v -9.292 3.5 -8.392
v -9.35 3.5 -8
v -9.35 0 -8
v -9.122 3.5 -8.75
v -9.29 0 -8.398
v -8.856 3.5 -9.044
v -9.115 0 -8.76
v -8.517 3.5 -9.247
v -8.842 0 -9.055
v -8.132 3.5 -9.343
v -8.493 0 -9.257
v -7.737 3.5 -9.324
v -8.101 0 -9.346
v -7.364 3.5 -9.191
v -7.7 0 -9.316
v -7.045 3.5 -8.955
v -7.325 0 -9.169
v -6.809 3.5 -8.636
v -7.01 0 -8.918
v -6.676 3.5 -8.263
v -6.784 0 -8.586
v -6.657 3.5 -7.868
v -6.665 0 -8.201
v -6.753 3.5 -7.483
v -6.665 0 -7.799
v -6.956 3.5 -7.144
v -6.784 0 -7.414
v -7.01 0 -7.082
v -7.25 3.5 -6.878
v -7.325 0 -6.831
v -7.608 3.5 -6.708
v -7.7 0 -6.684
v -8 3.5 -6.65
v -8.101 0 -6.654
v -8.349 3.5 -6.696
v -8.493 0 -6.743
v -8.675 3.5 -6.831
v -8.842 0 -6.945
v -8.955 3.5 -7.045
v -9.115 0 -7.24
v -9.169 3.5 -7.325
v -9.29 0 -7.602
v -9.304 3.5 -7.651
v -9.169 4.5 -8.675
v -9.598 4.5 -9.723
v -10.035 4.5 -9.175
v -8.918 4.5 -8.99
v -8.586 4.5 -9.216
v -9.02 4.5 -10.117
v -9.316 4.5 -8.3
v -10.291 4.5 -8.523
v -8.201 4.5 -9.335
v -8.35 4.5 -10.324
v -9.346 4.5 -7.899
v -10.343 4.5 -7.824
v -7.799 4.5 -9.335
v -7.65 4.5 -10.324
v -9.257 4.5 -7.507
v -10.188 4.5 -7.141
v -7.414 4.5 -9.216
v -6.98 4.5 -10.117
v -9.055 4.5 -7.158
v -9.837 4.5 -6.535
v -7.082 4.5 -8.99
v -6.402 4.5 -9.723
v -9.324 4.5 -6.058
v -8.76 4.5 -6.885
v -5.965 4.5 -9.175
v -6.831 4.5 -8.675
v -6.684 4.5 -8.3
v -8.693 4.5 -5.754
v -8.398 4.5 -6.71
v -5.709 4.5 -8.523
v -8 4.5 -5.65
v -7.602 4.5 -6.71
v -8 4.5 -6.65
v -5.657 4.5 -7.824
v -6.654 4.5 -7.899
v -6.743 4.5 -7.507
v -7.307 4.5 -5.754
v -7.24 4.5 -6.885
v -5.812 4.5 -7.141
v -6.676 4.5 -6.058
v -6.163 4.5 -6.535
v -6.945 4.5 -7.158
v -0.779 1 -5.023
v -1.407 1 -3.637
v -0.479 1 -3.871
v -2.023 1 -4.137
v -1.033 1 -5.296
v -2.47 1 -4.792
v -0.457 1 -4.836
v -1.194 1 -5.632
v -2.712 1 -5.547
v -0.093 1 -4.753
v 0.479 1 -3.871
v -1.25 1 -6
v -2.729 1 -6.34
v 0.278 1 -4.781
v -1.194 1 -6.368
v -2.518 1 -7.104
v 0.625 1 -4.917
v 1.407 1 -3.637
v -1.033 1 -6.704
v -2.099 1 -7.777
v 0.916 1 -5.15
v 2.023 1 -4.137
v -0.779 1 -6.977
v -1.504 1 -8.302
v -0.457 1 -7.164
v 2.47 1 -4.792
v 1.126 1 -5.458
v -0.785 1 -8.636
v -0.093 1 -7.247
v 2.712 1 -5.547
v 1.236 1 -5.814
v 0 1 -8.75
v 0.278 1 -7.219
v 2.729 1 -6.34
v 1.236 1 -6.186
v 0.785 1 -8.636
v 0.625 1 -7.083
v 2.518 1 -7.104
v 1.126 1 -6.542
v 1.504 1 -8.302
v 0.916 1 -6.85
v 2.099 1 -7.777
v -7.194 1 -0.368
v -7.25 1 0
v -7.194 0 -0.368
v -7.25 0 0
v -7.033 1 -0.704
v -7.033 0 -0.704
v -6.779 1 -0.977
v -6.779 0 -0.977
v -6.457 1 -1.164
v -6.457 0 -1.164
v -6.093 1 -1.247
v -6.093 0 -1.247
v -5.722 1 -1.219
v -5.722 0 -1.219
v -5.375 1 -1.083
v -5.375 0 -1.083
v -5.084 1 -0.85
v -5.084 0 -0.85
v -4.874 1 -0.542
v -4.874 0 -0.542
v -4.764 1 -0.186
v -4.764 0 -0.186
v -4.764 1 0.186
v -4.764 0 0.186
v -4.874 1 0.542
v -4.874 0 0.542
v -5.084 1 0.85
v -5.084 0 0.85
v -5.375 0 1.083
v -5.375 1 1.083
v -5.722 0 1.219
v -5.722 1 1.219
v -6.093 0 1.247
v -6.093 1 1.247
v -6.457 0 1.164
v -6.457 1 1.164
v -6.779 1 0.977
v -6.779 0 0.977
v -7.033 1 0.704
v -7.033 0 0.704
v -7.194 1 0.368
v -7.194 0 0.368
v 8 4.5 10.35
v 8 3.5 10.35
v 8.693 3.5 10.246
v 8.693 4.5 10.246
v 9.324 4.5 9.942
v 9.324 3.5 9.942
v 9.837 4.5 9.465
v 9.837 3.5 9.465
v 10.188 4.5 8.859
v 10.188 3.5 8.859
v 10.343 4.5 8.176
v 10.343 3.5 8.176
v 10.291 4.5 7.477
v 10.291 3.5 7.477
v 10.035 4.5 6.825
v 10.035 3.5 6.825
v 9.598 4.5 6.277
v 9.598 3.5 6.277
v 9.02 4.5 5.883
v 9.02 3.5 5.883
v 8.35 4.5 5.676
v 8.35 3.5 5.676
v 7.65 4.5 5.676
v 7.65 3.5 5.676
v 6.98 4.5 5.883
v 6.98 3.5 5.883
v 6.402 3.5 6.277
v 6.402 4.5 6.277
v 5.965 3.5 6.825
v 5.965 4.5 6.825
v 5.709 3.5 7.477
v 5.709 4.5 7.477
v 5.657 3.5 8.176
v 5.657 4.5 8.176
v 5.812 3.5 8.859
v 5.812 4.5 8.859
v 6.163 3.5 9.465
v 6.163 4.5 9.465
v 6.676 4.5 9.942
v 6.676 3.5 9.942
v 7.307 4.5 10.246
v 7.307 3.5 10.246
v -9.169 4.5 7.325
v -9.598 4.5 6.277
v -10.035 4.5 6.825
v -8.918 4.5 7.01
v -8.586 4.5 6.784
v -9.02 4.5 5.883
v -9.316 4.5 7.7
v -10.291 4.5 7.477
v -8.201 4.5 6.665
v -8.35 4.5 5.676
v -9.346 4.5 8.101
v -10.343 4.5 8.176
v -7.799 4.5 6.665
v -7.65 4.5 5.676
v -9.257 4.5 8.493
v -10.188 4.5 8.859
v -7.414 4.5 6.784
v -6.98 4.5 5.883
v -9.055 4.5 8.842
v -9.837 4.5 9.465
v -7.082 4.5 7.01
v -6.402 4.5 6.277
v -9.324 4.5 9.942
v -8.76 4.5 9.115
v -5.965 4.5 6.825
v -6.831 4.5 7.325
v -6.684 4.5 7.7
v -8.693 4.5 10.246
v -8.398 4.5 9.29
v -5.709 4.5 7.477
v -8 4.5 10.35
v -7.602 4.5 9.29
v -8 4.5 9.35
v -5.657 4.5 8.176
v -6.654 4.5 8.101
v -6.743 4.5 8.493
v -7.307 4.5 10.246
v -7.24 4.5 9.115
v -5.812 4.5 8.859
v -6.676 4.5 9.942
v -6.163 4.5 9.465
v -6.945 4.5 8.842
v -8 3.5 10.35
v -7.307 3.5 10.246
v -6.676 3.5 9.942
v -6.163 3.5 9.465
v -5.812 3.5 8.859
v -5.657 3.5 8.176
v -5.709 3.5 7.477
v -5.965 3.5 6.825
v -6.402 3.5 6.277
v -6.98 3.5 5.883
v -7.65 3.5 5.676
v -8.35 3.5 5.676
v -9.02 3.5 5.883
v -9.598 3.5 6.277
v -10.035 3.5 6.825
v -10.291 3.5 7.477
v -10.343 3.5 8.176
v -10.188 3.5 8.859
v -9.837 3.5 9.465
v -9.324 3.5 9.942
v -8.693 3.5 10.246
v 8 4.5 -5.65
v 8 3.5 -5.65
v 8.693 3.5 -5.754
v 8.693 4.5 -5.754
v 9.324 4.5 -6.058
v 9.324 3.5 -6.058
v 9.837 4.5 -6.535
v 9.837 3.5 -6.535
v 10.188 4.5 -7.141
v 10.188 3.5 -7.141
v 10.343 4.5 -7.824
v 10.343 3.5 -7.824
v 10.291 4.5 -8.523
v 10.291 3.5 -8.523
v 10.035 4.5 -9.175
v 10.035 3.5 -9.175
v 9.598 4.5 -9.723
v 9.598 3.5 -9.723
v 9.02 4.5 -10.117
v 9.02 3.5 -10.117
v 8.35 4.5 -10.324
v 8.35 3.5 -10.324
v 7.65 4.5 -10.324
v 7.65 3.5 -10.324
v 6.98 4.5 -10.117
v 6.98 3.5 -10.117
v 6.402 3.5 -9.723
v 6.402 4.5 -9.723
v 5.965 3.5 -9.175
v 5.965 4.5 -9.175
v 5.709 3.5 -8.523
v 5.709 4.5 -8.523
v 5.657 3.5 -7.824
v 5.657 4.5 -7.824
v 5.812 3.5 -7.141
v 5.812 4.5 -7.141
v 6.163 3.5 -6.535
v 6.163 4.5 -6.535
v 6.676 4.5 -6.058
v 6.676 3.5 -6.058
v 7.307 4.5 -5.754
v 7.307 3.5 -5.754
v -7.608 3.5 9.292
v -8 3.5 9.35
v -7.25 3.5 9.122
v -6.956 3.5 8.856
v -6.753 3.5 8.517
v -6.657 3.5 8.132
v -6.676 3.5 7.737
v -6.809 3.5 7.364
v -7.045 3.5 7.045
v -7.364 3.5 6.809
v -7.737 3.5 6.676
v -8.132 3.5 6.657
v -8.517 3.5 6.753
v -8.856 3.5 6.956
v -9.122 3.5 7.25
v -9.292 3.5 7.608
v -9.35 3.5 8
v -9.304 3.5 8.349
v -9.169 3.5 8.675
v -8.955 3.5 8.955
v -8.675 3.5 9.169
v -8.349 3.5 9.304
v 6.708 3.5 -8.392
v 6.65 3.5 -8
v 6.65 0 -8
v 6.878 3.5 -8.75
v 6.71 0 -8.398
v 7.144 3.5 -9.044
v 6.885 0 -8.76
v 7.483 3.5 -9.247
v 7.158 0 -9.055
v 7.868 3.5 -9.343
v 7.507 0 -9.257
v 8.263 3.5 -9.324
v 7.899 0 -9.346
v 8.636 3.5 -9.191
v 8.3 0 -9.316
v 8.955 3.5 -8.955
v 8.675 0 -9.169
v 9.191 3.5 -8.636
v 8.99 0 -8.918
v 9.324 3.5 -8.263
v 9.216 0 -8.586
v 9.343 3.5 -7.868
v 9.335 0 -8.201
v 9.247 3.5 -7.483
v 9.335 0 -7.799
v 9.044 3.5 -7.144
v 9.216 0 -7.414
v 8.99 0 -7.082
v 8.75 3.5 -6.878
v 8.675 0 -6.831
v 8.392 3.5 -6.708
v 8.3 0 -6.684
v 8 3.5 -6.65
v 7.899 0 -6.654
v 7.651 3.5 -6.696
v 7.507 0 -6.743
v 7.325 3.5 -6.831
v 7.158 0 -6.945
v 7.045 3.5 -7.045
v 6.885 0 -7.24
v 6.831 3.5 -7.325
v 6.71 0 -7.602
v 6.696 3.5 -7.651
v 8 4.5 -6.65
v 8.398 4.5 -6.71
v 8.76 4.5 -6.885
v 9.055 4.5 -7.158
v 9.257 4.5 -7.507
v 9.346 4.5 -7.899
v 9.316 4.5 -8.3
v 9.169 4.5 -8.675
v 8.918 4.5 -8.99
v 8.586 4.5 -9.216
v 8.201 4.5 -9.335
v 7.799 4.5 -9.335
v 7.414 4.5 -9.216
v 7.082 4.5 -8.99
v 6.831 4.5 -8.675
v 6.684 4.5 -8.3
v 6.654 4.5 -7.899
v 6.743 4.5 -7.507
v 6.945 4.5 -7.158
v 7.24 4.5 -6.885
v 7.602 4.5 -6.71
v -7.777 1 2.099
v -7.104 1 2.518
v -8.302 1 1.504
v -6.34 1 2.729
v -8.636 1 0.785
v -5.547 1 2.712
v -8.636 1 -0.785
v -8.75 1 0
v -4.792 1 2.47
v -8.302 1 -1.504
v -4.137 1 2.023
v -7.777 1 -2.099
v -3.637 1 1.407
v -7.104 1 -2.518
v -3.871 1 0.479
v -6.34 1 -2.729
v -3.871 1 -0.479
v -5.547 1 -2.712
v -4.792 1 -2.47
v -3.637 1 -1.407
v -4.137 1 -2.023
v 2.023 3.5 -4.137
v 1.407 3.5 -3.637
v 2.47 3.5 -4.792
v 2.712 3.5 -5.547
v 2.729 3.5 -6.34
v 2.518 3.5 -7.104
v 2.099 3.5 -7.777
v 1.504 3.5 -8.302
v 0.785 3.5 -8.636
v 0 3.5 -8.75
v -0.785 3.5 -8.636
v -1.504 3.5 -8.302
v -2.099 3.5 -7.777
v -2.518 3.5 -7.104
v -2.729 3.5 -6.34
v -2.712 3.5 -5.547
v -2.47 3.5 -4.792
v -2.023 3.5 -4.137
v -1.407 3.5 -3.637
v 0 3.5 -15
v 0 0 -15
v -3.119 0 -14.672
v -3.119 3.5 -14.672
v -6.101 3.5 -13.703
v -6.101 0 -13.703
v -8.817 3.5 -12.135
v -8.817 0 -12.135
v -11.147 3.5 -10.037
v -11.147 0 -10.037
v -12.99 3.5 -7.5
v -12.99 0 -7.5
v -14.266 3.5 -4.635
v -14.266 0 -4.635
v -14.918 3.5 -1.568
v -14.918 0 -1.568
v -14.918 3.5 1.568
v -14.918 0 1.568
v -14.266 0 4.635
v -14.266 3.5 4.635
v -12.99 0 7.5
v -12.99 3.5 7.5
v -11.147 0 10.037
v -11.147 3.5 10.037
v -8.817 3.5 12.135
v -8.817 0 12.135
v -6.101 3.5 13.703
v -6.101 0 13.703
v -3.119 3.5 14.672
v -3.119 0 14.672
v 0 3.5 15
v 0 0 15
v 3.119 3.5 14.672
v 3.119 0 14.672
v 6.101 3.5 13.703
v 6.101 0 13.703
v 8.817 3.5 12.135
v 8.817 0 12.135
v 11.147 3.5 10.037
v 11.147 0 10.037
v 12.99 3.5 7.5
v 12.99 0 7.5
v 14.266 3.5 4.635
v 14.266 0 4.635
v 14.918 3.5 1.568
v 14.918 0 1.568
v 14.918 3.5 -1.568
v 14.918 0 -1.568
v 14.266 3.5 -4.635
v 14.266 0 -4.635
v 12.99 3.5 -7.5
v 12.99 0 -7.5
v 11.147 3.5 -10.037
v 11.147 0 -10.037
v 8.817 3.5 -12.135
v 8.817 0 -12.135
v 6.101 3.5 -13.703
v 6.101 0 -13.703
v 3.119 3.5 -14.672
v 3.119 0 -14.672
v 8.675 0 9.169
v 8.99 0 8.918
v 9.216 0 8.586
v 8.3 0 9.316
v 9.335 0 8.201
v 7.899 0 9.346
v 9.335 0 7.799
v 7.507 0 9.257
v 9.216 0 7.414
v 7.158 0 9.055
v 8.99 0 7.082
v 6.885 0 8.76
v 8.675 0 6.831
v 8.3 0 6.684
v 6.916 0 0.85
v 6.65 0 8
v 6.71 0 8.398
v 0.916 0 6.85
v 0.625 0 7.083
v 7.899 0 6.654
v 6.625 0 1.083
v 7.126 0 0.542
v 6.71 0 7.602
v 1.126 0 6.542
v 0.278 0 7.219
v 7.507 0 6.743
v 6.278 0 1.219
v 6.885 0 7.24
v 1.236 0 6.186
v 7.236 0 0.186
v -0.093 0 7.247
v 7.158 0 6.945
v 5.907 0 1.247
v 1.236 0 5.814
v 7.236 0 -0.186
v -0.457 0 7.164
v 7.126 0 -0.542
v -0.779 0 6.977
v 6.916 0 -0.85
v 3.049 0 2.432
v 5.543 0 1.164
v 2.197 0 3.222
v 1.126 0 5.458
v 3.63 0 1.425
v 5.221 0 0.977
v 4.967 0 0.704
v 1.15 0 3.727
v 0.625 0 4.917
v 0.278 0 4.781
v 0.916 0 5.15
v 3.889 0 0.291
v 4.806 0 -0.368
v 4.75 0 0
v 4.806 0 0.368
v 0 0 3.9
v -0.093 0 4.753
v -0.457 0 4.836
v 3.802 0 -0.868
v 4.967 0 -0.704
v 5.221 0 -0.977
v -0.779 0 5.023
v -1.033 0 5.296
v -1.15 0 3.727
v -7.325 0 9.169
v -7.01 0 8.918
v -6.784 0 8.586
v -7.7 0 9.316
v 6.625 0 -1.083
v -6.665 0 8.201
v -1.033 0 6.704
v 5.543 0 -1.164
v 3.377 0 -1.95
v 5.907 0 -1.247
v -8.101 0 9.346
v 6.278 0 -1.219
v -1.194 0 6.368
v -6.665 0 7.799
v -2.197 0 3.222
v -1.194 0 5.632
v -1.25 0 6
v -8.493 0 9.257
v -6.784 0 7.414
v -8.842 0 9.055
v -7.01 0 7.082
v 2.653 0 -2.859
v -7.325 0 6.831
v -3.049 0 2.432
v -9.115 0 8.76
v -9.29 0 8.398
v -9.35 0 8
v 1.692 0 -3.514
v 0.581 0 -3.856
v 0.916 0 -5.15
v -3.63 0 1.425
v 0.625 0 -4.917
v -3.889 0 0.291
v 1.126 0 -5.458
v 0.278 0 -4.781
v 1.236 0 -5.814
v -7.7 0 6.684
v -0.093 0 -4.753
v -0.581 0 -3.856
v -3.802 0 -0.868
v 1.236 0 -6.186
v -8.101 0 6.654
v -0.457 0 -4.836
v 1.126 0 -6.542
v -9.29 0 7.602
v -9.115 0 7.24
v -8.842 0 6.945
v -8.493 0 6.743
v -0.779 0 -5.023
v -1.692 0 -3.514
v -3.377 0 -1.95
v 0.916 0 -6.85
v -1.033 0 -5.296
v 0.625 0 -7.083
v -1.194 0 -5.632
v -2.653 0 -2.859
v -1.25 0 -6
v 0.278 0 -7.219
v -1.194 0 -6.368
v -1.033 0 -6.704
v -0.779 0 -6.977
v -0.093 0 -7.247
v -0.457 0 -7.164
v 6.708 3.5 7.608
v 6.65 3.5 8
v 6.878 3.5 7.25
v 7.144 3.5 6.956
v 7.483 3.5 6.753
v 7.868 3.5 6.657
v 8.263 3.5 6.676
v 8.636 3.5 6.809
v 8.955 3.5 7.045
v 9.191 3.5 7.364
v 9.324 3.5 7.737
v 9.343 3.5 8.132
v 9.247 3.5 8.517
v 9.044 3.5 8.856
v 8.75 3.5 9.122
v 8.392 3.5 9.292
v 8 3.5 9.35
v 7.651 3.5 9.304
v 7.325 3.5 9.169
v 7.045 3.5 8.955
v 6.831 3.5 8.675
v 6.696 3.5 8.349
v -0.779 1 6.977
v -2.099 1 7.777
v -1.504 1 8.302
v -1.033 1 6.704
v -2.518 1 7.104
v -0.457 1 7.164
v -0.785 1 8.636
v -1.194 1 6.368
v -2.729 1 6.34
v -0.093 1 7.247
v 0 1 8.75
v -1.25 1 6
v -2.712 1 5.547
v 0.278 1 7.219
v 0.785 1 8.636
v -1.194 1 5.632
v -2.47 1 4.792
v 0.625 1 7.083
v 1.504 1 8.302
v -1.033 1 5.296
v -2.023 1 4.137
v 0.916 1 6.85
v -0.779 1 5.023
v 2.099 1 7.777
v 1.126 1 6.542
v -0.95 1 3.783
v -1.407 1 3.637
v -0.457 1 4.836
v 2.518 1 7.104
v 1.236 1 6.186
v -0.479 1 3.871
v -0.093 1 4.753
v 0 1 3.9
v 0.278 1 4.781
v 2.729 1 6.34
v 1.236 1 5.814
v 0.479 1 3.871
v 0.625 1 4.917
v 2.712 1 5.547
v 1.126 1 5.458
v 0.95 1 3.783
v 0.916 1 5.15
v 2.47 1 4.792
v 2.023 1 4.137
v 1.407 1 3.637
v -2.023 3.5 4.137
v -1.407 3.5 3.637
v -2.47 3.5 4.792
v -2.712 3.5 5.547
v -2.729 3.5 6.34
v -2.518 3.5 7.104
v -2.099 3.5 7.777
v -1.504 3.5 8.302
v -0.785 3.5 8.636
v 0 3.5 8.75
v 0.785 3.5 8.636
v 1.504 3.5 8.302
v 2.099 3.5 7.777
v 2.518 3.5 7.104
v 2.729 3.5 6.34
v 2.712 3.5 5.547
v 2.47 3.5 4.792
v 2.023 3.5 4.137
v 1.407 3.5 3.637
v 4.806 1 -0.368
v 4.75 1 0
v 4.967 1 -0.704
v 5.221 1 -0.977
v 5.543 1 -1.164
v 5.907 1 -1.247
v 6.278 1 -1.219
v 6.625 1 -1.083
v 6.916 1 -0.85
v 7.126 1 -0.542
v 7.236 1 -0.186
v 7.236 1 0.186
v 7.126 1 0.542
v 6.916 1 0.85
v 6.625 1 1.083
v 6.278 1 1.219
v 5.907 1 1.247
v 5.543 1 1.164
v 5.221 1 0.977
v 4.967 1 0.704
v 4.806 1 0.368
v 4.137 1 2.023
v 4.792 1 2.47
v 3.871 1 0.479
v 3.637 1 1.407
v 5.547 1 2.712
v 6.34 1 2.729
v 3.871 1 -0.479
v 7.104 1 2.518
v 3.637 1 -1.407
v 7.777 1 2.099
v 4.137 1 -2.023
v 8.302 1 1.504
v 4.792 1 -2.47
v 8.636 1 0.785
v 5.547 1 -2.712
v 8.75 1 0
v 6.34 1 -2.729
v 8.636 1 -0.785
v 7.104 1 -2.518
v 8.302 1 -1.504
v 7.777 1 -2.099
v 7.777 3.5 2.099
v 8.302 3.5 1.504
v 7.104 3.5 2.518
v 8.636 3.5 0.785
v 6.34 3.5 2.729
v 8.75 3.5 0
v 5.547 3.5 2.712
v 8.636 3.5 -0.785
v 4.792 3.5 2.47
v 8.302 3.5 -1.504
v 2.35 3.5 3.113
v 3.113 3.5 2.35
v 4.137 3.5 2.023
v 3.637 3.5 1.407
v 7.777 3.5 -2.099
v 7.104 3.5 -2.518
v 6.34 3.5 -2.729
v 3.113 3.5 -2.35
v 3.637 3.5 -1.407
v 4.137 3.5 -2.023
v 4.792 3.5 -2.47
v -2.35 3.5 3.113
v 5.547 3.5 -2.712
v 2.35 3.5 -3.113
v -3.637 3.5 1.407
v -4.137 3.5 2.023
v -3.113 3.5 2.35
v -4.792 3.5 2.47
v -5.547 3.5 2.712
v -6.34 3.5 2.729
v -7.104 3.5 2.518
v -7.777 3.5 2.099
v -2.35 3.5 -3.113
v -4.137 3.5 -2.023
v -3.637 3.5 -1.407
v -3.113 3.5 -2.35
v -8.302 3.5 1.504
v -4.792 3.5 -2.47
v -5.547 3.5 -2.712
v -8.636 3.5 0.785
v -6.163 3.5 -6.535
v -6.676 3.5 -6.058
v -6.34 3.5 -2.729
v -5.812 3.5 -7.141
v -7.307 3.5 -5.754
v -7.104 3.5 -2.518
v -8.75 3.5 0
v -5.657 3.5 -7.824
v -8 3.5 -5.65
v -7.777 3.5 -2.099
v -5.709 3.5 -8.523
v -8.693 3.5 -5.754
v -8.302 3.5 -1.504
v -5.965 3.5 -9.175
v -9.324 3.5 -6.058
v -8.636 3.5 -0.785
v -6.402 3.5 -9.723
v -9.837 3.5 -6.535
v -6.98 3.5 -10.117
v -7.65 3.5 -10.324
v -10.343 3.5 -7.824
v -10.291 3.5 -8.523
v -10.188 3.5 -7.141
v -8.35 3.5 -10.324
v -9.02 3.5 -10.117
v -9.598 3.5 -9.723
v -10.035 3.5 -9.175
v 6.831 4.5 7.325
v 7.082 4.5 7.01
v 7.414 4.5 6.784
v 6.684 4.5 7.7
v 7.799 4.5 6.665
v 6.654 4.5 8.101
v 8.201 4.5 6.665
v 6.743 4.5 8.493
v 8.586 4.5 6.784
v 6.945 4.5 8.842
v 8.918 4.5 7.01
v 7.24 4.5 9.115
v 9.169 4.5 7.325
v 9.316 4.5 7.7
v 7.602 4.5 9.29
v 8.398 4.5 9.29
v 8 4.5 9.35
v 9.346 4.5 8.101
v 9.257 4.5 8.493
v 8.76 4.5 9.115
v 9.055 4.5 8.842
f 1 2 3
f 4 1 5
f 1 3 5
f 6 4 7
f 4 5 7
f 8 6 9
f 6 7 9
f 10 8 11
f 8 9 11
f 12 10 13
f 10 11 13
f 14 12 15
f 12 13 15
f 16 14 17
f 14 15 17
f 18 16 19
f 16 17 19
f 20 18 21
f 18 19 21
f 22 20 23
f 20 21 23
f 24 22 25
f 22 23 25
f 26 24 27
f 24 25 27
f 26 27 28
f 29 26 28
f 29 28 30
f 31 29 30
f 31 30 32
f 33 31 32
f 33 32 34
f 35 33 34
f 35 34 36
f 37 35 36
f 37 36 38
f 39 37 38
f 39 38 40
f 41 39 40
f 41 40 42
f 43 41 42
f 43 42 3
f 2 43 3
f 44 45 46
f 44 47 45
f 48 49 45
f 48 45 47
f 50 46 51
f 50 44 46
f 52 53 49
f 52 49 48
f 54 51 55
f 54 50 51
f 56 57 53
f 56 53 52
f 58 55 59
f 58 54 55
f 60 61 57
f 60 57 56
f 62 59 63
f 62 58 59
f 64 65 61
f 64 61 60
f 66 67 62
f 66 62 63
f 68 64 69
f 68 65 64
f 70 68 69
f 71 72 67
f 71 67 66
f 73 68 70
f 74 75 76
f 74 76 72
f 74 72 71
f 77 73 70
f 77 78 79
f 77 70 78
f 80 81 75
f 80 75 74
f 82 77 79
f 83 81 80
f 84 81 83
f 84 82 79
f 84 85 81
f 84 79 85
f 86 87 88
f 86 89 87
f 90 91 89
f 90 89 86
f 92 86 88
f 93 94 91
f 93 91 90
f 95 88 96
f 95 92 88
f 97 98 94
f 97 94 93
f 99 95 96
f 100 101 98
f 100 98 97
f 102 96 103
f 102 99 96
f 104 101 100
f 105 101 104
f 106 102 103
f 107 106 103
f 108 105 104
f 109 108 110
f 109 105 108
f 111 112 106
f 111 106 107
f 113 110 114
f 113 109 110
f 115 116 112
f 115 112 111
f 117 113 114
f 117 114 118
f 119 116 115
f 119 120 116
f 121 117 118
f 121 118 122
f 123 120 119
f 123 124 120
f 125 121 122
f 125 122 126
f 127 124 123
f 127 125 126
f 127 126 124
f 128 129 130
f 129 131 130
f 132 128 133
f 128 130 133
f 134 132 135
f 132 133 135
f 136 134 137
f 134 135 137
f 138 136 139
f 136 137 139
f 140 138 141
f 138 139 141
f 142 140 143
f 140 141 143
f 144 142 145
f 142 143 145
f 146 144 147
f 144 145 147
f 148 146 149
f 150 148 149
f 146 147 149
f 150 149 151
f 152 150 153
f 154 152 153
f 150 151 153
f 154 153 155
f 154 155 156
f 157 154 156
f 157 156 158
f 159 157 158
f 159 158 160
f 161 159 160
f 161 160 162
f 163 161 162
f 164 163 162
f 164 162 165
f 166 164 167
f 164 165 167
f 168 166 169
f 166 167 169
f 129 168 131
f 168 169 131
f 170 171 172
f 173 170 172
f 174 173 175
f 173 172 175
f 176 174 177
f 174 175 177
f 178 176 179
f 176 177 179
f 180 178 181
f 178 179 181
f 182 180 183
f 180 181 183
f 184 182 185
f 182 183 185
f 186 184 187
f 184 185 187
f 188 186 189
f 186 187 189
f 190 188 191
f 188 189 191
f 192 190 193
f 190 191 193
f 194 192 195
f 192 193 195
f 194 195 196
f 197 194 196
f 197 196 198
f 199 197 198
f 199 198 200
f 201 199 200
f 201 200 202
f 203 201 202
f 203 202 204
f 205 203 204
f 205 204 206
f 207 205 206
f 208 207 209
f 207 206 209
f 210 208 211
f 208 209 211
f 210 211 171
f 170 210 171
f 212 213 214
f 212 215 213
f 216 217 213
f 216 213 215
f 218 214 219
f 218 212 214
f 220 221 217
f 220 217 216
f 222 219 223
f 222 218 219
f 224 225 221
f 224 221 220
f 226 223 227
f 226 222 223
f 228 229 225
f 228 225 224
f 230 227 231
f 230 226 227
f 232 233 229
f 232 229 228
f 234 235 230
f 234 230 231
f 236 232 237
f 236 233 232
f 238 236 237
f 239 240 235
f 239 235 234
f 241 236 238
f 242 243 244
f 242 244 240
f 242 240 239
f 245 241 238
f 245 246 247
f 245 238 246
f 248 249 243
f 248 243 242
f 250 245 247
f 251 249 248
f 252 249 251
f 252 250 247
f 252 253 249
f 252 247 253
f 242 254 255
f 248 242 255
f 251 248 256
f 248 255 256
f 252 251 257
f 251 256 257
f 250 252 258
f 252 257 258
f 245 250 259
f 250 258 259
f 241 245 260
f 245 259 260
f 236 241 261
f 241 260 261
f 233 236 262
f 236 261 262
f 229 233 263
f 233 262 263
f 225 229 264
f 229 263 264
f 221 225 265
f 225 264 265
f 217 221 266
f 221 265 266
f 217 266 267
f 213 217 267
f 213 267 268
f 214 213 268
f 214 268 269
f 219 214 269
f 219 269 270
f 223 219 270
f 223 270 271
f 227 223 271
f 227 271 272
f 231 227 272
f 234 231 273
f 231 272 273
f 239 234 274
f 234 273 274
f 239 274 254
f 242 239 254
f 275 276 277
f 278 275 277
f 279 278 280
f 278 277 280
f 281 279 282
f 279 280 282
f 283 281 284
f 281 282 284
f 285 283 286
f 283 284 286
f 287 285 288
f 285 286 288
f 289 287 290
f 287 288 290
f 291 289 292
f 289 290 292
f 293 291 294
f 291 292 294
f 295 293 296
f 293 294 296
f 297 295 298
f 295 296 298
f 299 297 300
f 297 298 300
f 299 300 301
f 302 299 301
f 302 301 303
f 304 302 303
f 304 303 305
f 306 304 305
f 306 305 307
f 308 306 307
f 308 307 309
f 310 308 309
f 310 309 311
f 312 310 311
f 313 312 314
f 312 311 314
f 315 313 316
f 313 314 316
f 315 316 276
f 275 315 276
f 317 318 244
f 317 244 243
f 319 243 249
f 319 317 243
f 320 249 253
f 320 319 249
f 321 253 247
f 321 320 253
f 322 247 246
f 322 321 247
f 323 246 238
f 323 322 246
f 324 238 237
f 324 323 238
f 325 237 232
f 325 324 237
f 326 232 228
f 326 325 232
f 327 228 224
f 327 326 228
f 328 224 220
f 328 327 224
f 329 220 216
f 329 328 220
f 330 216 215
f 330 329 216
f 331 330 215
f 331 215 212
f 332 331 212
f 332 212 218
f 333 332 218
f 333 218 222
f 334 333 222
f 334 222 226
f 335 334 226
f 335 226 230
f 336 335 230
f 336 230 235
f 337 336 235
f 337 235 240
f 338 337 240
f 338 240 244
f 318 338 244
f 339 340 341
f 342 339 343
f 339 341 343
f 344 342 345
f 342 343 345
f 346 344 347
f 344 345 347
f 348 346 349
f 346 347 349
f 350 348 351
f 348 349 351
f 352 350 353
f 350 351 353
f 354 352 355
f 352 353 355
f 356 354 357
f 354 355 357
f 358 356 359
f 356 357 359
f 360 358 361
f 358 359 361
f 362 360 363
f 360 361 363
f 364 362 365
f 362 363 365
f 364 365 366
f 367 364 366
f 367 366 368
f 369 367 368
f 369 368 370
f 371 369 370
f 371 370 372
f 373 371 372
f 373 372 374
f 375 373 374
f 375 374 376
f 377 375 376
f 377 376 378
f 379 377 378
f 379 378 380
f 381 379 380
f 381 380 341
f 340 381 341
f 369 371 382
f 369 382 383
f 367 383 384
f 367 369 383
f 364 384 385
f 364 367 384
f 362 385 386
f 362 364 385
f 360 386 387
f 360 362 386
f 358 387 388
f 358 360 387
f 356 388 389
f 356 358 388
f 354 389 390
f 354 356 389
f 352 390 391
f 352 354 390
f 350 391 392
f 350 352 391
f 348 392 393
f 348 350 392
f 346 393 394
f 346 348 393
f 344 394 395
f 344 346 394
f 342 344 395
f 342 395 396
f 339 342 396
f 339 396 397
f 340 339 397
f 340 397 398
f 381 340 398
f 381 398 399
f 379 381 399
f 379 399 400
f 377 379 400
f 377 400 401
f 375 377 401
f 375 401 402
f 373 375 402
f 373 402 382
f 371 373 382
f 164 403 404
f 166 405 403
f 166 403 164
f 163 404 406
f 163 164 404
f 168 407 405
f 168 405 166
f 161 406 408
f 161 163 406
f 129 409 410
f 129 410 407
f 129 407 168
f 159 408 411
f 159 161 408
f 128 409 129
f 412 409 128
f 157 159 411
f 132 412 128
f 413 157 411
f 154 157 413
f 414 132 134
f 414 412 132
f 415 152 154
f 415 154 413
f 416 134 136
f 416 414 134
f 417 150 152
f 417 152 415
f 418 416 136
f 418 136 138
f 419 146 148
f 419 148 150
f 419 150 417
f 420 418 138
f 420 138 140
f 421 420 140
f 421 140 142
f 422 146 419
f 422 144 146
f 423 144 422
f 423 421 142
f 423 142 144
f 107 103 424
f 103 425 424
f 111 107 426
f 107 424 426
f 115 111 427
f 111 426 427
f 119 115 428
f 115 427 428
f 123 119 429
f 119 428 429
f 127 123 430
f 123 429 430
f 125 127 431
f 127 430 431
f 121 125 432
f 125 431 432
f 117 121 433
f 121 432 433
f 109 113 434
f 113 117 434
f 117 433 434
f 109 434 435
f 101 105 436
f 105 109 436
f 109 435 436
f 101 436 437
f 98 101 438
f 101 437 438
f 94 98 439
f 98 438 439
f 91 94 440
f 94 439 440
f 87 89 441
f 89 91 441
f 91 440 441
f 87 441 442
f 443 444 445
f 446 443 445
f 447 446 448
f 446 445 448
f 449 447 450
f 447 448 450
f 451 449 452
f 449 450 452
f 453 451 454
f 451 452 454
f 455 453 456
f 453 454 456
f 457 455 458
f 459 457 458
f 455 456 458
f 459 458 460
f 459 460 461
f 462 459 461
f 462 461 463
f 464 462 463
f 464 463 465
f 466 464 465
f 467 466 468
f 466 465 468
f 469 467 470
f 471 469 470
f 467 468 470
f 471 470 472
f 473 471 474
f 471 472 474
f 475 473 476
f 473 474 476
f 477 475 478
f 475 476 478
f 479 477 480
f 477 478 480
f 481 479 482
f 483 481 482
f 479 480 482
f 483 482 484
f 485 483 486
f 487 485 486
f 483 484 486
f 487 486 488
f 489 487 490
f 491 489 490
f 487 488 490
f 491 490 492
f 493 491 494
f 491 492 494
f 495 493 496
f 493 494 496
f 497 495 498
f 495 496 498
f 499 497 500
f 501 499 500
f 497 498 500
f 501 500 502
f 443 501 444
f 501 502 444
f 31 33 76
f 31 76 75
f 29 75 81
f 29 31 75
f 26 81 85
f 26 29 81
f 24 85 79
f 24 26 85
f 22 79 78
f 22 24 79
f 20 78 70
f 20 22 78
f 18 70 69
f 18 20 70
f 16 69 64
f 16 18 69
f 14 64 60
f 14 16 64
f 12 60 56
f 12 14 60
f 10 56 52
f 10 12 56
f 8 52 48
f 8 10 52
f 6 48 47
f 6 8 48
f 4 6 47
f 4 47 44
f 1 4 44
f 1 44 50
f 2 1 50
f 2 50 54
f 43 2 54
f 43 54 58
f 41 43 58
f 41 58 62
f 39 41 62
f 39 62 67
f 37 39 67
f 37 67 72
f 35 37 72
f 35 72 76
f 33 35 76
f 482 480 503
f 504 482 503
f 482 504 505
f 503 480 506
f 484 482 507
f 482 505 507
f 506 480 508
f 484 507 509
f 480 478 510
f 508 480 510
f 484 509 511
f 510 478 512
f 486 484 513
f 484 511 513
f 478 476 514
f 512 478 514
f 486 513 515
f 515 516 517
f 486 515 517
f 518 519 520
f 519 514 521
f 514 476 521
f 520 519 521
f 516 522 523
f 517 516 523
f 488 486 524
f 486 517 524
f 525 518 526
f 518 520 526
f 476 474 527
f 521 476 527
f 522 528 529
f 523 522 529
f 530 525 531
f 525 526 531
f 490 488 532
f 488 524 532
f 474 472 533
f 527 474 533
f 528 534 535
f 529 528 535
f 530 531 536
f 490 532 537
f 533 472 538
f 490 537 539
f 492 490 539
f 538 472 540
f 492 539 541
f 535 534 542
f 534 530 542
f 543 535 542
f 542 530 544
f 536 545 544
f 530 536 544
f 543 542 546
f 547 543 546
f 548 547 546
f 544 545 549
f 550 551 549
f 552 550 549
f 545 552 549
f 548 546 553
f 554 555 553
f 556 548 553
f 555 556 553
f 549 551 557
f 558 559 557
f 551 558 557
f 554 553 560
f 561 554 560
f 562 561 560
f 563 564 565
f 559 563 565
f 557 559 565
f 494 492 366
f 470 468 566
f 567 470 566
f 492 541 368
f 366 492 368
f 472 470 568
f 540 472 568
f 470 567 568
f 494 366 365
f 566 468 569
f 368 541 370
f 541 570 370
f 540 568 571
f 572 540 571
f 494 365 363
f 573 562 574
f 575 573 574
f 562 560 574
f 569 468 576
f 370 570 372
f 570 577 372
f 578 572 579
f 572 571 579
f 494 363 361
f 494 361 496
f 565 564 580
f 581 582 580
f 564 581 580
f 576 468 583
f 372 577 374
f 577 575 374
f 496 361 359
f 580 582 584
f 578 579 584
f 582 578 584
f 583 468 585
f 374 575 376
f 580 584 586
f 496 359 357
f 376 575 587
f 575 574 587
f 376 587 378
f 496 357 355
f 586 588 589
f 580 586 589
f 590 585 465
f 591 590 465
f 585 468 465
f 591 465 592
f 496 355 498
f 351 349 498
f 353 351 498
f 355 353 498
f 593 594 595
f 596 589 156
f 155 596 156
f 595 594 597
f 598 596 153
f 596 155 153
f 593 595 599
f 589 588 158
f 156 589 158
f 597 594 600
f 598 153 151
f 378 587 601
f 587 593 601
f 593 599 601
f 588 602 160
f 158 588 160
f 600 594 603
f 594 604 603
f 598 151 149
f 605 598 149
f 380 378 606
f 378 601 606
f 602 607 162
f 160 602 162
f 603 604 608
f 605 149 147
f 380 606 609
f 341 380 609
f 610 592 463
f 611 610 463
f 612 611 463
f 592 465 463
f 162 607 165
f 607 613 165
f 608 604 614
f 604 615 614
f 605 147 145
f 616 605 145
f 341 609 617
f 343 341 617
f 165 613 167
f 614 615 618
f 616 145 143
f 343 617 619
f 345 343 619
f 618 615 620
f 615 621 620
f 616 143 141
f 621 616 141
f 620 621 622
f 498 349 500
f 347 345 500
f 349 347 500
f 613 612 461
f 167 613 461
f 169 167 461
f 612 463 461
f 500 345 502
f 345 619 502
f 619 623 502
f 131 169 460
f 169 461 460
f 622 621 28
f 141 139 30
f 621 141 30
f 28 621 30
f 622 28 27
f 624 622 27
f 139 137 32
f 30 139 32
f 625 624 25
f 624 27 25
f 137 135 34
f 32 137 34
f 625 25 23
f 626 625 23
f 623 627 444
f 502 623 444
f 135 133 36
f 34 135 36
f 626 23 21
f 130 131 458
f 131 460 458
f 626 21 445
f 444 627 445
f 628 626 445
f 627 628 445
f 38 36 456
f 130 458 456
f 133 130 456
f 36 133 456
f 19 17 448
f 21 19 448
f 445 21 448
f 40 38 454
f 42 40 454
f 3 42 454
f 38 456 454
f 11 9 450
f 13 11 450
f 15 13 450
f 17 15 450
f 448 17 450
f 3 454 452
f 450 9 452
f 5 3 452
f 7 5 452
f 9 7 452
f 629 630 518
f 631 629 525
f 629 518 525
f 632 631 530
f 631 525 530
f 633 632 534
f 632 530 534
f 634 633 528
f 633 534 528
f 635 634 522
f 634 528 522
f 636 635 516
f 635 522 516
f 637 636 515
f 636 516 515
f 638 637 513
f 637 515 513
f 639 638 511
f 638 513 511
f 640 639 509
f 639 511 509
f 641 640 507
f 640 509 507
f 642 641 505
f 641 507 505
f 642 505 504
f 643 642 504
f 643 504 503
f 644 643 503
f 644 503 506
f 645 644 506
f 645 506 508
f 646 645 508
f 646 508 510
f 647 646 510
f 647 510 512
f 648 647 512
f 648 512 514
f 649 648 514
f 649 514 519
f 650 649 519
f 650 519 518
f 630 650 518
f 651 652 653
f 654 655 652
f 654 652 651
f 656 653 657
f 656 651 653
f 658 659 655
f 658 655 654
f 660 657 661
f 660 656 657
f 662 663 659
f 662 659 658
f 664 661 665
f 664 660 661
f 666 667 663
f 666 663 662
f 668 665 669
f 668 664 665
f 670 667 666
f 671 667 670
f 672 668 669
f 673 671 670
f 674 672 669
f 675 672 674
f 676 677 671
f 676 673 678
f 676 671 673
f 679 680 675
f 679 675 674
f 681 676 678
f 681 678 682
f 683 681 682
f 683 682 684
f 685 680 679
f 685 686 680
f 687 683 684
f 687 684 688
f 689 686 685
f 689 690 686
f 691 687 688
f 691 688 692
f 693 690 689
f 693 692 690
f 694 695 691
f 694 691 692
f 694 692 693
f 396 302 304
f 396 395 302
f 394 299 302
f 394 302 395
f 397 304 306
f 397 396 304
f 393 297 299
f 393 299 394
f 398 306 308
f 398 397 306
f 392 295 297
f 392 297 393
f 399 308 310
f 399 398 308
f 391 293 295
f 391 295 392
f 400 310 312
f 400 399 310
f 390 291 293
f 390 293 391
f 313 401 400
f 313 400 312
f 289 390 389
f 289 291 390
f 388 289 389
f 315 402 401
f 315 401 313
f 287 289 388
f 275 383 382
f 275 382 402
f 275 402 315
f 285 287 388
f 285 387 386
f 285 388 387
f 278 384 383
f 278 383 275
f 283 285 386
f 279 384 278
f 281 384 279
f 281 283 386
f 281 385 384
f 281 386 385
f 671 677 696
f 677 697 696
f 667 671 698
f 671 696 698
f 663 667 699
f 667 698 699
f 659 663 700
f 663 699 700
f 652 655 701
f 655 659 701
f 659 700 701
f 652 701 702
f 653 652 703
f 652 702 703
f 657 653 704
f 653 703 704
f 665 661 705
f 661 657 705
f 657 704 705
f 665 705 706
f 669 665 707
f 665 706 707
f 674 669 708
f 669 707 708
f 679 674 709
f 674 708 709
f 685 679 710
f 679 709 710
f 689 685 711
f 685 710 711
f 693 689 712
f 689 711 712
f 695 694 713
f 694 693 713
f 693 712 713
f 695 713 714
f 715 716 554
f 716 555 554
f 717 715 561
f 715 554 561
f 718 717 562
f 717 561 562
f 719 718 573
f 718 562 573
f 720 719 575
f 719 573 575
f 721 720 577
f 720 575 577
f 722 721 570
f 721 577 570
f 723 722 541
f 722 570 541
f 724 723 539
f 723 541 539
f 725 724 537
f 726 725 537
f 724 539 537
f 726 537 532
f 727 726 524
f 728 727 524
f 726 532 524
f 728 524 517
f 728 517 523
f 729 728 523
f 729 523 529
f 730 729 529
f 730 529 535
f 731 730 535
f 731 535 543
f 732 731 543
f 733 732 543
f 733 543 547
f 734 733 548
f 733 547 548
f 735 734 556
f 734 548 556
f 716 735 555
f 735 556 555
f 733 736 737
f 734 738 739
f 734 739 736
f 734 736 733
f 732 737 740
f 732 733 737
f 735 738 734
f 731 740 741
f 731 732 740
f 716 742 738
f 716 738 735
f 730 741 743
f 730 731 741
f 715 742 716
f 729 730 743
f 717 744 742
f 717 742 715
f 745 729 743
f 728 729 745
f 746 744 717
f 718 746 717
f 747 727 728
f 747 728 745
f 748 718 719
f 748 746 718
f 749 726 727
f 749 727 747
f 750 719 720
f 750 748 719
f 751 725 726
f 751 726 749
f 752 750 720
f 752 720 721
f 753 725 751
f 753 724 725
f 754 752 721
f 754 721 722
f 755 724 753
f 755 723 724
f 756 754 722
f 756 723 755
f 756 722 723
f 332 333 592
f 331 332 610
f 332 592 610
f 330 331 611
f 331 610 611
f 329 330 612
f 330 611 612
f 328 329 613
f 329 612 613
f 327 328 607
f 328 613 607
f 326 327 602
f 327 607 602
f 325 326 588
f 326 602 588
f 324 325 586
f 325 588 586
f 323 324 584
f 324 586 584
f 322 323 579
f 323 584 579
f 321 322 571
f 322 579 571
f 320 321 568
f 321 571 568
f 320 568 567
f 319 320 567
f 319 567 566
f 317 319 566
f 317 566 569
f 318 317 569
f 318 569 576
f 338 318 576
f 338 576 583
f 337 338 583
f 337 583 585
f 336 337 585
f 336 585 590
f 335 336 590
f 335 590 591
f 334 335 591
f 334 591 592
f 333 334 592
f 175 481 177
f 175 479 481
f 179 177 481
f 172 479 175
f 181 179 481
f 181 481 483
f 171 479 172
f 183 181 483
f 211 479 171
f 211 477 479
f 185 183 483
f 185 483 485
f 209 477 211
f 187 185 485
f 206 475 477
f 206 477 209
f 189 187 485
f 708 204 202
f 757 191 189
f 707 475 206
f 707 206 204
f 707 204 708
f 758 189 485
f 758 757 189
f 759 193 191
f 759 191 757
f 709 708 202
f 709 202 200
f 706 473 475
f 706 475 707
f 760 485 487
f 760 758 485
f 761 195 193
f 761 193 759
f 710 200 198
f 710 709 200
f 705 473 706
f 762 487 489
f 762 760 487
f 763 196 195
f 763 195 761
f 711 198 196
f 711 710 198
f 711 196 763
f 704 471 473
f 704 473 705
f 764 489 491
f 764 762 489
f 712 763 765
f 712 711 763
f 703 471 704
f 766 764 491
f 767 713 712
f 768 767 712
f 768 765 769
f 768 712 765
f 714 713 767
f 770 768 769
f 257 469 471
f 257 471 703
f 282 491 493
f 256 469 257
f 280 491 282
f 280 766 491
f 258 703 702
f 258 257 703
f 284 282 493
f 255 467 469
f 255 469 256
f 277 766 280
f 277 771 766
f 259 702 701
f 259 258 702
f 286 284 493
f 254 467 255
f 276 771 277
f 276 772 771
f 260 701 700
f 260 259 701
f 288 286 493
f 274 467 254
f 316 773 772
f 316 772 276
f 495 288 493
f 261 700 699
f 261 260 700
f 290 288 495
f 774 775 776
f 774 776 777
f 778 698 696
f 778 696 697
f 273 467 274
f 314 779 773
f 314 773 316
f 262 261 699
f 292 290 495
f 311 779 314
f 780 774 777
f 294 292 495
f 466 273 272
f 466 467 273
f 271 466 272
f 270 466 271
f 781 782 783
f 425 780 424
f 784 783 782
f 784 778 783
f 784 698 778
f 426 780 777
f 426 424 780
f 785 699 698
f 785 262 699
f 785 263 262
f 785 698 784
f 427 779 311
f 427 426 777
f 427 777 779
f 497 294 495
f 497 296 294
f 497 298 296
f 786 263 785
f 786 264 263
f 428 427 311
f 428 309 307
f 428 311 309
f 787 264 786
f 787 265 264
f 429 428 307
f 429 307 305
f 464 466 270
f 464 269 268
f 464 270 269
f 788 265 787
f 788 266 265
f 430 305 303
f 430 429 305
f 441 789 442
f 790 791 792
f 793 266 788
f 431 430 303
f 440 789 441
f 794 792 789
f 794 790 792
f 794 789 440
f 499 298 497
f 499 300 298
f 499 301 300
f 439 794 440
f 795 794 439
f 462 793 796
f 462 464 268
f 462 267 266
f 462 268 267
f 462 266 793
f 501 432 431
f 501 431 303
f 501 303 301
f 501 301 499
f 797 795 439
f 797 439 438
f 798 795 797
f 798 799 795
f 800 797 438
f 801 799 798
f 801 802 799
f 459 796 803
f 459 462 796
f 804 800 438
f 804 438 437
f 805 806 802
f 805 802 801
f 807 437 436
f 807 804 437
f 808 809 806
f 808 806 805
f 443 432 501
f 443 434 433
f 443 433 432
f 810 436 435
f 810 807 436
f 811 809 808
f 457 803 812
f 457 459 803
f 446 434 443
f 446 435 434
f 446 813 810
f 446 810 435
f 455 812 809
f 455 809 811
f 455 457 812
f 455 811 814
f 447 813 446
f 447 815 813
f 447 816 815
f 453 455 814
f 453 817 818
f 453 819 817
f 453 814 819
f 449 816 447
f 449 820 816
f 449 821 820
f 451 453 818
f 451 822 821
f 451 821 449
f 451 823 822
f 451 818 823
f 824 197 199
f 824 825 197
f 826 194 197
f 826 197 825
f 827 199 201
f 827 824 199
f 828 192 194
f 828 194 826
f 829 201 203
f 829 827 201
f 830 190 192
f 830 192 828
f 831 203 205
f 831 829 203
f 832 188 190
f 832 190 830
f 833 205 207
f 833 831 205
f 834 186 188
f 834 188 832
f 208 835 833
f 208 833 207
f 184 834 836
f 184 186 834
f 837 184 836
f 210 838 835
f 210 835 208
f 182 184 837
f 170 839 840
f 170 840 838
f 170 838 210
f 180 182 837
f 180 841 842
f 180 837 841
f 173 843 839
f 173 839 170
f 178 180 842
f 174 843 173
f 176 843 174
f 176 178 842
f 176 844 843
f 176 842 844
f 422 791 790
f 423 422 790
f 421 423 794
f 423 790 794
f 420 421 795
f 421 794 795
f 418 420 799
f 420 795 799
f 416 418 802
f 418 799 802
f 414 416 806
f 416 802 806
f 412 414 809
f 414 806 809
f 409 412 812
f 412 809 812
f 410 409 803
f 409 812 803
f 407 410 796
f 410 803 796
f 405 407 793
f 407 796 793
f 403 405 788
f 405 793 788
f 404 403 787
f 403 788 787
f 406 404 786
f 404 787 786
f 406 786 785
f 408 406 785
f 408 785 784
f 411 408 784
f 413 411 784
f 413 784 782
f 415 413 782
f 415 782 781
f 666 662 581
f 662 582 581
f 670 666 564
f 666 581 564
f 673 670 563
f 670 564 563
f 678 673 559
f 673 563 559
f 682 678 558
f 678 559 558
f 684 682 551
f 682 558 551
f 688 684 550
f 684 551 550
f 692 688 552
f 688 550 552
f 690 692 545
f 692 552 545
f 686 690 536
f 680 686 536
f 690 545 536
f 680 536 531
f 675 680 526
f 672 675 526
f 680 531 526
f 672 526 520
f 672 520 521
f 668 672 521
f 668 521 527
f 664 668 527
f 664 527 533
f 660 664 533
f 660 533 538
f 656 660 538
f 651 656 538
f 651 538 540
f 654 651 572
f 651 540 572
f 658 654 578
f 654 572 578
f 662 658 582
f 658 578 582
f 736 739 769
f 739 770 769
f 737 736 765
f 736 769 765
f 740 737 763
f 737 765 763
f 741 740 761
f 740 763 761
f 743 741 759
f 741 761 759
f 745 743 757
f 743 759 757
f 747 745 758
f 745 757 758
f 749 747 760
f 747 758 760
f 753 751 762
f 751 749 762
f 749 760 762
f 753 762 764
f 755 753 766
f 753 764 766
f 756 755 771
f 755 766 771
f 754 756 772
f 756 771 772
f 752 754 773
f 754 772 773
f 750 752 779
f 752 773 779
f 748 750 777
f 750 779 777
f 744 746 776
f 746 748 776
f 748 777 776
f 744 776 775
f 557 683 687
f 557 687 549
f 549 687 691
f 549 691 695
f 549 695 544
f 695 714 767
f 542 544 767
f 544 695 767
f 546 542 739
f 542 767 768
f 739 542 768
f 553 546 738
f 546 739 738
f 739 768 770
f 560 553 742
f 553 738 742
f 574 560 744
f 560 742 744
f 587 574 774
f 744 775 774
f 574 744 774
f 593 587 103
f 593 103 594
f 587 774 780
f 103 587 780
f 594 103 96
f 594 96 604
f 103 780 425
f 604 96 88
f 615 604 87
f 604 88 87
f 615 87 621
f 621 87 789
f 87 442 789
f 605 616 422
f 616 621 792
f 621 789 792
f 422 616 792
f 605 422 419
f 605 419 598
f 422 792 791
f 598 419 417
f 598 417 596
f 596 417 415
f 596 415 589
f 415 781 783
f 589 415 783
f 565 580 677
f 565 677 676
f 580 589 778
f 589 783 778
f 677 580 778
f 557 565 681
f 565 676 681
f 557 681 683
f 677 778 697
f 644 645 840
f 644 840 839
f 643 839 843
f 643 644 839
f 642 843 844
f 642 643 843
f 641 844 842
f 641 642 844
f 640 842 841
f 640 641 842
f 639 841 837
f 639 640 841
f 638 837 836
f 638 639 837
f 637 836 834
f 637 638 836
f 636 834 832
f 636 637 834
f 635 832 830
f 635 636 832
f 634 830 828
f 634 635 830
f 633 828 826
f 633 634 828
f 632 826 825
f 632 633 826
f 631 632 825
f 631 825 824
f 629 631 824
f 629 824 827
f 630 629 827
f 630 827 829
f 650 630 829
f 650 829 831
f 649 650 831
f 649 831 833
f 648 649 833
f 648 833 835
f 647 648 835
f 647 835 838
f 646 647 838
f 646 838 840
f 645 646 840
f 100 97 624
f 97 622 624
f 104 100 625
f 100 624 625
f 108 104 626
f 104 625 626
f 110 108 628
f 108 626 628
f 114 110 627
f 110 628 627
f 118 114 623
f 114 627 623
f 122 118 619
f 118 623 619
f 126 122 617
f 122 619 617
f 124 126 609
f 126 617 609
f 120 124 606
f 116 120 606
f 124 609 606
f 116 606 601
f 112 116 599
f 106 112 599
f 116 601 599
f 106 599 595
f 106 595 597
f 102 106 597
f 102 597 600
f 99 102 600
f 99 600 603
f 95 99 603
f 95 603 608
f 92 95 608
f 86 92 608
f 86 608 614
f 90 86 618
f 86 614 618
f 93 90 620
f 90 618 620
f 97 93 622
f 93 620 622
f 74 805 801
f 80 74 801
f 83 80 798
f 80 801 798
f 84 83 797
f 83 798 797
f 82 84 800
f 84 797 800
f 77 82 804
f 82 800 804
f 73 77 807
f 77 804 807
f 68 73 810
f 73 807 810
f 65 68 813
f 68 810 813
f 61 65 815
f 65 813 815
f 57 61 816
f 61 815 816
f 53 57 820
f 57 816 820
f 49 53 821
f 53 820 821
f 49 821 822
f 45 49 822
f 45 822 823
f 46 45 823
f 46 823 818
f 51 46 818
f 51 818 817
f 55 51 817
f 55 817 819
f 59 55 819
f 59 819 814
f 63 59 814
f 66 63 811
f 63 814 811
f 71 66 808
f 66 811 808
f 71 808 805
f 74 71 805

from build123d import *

# Parameters (mm, degrees)
SKETCH1_R                               = 15
BOSS_EXTRUDE1_DEPTH                     = 3.5
SKETCH2_R                               = 3.9
CUT_EXTRUDE1_DEPTH                      = 22.5
CBORE_FOR_M5_HEX_HEAD_BOLT1_D           = 2.5
CBORE_FOR_M5_HEX_HEAD_BOLT1_CBORE_D     = 5.5
CBORE_FOR_M5_HEX_HEAD_BOLT1_CBORE_DEPTH = 2.5
TAP_DRILL_FOR_M3X0_5_TAP1_D             = 2.7
SKETCH9_R                               = 2.35
SKETCH9_R_2                             = 1.35
BOSS_EXTRUDE2_DEPTH                     = 1


with BuildPart() as part:
    # Sketch1 → Boss-Extrude1 (new body)
    with BuildSketch(Plane(origin=(0, 0, 0), x_dir=(1, 0, 0), z_dir=(0, 1, 0))):
        with Locations(Location((0, 0, 0), (0, 0, 90))):
            Circle(SKETCH1_R)
    extrude(amount=BOSS_EXTRUDE1_DEPTH)

    # Sketch2 → Cut-Extrude1 (cut, through all)
    with BuildSketch(Plane(origin=(0, 3.5, 0), x_dir=(1, 0, 0), z_dir=(0, 1, 0))):
        with Locations(Location((0, 0, 0), (0, 0, 270))):
            Circle(SKETCH2_R)
    extrude(amount=-CUT_EXTRUDE1_DEPTH, mode=Mode.SUBTRACT)

    # CBORE for M5 Hex Head Bolt1 (through all)
    with Locations(Plane(origin=(0, 3.5, 0), x_dir=(1, 0, 0), z_dir=(0, 1, 0))):
        with Locations((-6, 0), (0, 6), (6, 0), (0, -6)):
            CounterBoreHole(CBORE_FOR_M5_HEX_HEAD_BOLT1_D / 2, CBORE_FOR_M5_HEX_HEAD_BOLT1_CBORE_D / 2, CBORE_FOR_M5_HEX_HEAD_BOLT1_CBORE_DEPTH)

    # Tap Drill for M3x0.5 Tap1 (through all)
    with Locations(Plane(origin=(0, 3.5, 0), x_dir=(1, 0, 0), z_dir=(0, 1, 0))):
        with Locations((-8, 8), (8, 8), (8, -8), (-8, -8)):
            Hole(TAP_DRILL_FOR_M3X0_5_TAP1_D / 2)

    # Sketch9 → Boss-Extrude2 (add)
    # profile 1 of 4: a face of its own
    with BuildSketch(Plane(origin=(0, 3.5, 0), x_dir=(1, 0, 0), z_dir=(0, 1, 0))):
        with Locations(Location((8, -8, 0), (0, 0, 270))):
            Circle(SKETCH9_R)
        with Locations(Location((8, -8, 0), (0, 0, 270))):
            Circle(SKETCH9_R_2, mode=Mode.SUBTRACT)
    # profile 2 of 4: a face of its own
    with BuildSketch(Plane(origin=(0, 3.5, 0), x_dir=(1, 0, 0), z_dir=(0, 1, 0))):
        with Locations(Location((8, 8, 0), (0, 0, 270))):
            Circle(SKETCH9_R)
        with Locations(Location((8, 8, 0), (0, 0, 270))):
            Circle(SKETCH9_R_2, mode=Mode.SUBTRACT)
    # profile 3 of 4: a face of its own
    with BuildSketch(Plane(origin=(0, 3.5, 0), x_dir=(1, 0, 0), z_dir=(0, 1, 0))):
        with Locations(Location((-8, -8, 0), (0, 0, 270))):
            Circle(SKETCH9_R)
        with Locations(Location((-8, -8, 0), (0, 0, 270))):
            Circle(SKETCH9_R_2, mode=Mode.SUBTRACT)
    # profile 4 of 4: a face of its own
    with BuildSketch(Plane(origin=(0, 3.5, 0), x_dir=(1, 0, 0), z_dir=(0, 1, 0))):
        with Locations(Location((-8, 8, 0), (0, 0, 270))):
            Circle(SKETCH9_R)
        with Locations(Location((-8, 8, 0), (0, 0, 270))):
            Circle(SKETCH9_R_2, mode=Mode.SUBTRACT)
    extrude(amount=BOSS_EXTRUDE2_DEPTH)


solid = part.part
